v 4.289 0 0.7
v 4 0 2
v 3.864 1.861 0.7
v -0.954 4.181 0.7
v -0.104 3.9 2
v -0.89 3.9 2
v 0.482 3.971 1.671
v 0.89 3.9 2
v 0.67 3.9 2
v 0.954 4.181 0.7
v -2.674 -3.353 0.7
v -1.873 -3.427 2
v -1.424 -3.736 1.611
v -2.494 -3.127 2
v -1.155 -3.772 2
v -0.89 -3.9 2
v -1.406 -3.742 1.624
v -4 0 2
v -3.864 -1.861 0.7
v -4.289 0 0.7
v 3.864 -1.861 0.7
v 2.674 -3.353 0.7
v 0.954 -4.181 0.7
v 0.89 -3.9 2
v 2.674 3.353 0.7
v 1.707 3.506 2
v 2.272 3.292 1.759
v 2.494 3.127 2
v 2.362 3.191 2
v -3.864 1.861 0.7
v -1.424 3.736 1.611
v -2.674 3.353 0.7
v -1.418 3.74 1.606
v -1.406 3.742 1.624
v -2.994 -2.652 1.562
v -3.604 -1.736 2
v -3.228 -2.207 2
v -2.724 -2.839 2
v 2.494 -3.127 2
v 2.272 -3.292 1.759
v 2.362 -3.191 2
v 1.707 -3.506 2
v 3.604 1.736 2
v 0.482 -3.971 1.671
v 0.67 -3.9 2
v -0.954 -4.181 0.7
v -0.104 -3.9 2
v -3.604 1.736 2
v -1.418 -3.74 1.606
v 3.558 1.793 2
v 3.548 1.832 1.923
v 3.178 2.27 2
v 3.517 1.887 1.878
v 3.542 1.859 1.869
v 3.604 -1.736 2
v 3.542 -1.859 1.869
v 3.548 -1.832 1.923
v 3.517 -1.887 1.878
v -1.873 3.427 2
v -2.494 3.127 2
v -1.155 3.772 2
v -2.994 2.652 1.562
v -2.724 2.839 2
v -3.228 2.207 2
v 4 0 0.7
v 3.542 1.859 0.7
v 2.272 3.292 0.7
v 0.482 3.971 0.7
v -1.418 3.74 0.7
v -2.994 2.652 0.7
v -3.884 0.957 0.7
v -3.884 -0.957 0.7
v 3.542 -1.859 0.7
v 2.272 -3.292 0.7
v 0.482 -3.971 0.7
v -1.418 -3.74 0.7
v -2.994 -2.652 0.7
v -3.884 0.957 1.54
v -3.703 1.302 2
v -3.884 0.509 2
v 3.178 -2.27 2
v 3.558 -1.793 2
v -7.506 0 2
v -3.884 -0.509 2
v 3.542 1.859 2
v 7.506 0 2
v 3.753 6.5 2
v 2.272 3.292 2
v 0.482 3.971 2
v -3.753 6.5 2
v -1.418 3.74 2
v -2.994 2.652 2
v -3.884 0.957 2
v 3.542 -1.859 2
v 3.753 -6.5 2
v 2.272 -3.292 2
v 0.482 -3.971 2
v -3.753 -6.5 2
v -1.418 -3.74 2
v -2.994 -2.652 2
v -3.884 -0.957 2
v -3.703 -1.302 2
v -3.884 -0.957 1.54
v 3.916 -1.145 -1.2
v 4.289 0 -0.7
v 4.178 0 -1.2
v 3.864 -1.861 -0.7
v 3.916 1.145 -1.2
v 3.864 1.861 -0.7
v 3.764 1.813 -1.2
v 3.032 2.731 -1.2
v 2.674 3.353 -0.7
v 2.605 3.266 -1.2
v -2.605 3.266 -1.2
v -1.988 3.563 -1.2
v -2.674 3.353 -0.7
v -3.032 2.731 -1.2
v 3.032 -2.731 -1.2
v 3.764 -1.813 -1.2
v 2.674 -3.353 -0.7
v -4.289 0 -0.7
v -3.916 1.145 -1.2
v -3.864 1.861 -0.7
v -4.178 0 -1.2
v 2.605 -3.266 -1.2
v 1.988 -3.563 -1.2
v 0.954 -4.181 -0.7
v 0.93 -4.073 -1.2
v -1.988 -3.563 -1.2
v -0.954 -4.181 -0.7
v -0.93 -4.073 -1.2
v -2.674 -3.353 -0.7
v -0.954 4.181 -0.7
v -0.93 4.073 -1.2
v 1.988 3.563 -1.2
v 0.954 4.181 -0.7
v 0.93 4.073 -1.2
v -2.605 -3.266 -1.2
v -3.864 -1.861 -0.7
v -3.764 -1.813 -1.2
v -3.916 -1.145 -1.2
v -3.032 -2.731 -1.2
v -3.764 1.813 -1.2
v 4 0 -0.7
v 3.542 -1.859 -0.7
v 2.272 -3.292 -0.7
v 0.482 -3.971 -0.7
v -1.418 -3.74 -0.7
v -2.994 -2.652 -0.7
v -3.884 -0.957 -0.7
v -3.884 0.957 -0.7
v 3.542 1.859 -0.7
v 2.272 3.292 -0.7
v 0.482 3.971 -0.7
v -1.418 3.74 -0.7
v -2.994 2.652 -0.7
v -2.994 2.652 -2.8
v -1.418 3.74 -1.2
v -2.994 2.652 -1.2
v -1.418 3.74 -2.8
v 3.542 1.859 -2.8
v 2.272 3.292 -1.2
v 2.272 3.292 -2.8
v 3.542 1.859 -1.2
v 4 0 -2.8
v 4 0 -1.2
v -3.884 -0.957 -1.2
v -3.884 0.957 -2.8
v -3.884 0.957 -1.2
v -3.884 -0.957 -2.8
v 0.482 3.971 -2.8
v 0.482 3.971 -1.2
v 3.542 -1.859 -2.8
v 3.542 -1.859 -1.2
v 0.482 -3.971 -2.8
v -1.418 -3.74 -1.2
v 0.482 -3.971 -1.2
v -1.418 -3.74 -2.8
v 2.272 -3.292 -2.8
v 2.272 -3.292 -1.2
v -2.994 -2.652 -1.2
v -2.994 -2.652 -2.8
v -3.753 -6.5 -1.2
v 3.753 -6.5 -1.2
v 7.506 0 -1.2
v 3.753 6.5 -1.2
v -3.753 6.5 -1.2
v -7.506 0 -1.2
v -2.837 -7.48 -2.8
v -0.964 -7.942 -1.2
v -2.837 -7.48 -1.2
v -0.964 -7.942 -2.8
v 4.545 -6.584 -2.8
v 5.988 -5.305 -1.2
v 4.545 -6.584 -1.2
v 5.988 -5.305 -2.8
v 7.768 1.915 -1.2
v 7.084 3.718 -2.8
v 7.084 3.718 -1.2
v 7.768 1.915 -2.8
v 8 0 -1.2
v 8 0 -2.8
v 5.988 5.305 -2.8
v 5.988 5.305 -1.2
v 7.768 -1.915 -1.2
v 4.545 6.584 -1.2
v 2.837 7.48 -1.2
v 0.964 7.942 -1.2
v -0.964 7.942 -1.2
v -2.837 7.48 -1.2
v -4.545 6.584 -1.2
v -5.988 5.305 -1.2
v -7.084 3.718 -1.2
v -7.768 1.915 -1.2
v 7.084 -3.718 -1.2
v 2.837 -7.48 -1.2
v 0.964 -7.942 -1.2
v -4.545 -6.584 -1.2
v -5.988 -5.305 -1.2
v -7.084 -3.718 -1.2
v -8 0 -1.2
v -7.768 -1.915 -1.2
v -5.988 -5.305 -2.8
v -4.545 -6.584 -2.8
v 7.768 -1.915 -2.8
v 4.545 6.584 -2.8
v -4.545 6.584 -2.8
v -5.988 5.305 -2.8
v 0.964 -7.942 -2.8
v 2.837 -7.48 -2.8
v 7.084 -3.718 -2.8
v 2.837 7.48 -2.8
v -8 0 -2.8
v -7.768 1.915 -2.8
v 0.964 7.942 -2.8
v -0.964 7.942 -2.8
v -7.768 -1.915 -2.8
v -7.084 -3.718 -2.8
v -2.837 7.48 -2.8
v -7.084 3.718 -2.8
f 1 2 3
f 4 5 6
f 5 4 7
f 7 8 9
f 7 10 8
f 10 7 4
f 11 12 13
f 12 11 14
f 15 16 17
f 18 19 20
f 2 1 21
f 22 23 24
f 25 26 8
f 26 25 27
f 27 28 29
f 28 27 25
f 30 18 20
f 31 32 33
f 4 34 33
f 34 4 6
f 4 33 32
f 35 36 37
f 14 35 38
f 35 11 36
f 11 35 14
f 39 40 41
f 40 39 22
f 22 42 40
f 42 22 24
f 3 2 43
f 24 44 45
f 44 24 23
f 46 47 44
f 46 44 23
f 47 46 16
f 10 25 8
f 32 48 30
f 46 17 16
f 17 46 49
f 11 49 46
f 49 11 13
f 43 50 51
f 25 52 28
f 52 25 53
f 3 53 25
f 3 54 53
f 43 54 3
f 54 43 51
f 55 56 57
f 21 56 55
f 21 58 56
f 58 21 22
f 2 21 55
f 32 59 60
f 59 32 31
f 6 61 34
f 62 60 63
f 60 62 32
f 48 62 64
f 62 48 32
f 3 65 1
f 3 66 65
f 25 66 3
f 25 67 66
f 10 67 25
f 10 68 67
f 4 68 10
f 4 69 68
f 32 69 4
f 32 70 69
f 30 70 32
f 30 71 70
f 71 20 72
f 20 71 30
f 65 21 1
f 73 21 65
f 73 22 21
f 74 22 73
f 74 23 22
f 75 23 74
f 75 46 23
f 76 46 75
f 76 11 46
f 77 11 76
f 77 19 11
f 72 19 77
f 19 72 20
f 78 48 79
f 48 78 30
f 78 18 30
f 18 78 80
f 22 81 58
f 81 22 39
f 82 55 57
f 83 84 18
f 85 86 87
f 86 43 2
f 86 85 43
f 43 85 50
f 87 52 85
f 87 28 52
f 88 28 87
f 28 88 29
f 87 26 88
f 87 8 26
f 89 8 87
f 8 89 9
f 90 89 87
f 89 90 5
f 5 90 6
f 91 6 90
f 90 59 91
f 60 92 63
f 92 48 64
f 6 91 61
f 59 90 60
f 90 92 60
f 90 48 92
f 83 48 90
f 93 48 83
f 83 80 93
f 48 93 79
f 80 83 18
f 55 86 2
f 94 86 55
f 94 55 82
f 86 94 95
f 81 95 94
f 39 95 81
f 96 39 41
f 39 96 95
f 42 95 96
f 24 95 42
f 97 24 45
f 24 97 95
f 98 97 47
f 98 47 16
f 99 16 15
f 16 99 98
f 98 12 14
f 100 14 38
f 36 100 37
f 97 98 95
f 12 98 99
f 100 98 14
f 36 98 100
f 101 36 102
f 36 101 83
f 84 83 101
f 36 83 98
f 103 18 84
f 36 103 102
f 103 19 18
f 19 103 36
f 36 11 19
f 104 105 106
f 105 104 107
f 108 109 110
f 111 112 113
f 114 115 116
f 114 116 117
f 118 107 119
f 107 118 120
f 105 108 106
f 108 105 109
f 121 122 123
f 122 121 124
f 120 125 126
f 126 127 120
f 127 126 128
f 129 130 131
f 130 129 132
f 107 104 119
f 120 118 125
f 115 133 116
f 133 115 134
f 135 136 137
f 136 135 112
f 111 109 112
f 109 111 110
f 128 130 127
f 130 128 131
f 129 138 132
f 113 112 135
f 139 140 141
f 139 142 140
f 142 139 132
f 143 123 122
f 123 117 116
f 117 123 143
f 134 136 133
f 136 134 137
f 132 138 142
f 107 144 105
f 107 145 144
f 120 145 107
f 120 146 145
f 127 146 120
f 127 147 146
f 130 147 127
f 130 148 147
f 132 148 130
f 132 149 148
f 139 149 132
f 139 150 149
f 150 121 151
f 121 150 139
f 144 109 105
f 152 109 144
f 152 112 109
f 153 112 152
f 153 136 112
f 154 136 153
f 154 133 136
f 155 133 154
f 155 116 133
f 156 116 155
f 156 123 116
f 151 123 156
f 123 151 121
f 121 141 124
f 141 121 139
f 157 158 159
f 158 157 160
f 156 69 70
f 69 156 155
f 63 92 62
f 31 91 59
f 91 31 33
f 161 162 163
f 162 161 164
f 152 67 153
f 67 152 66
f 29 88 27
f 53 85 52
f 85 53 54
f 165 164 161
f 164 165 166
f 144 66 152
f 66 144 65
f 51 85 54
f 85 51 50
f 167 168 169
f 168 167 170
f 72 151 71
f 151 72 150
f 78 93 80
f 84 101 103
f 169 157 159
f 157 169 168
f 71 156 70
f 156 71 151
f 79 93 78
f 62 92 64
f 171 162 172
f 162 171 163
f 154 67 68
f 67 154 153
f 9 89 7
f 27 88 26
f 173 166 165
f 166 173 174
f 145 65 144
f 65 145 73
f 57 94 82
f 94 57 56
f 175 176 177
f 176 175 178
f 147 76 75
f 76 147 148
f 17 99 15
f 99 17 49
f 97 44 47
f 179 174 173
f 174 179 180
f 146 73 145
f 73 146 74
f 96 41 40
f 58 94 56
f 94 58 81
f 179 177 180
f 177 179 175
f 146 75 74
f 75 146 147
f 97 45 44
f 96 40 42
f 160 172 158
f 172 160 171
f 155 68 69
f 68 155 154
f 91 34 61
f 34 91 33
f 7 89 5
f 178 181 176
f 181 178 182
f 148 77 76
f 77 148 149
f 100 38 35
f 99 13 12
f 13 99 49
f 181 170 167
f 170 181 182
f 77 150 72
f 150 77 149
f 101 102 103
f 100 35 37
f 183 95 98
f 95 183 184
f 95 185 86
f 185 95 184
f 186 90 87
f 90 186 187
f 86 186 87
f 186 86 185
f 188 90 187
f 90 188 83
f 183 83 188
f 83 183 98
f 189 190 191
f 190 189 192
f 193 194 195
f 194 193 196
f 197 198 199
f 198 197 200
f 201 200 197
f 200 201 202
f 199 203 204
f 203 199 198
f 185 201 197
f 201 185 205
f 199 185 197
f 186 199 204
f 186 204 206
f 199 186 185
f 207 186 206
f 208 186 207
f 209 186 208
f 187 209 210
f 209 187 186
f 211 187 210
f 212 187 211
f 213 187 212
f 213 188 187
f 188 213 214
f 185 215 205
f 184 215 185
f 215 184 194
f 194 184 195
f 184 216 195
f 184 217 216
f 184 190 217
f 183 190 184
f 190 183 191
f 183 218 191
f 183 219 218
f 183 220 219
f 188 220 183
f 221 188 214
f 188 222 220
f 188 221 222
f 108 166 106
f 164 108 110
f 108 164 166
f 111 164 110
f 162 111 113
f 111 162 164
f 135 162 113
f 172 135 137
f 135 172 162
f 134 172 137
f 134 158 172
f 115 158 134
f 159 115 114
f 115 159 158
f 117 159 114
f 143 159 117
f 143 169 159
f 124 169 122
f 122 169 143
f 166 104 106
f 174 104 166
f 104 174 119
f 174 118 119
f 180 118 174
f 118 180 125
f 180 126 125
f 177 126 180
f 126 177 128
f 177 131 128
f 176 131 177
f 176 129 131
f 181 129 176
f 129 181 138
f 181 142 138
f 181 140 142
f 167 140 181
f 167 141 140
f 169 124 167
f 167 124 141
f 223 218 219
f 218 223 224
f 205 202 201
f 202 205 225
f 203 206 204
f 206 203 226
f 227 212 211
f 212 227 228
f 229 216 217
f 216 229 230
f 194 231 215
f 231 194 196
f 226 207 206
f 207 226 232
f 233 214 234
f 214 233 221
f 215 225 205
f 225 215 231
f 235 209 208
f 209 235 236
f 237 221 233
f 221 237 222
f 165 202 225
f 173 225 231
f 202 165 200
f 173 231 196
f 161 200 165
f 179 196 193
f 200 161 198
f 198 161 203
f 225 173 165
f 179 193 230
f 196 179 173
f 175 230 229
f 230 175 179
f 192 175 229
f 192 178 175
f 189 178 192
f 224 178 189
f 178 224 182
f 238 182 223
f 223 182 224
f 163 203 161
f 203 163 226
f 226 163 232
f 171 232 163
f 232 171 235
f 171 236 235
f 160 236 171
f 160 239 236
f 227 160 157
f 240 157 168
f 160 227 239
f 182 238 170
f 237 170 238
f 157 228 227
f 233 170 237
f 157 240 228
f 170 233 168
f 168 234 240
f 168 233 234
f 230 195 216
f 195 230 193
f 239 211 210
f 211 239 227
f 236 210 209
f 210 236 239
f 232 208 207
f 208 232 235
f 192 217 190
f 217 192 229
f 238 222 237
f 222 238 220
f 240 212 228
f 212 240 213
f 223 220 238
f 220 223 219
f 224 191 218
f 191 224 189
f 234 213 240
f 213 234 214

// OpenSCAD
// Parameters
thread_nominal_diameter = 8; //[4:16:0.1]
across_flats = 13; //[6.5:26:0.1]
thickness = 4; //[2:8:0.1]
hole_diameter = 8; //[6:10:0.05]
hex_corner_diameter = 15.011; //[7.5055:30.022:0.001]
chamfer_height = 0.5; //[0.25:1:0.05]
chamfer_angle_deg = 30; //[15:60:1]
washer_outer_diameter = 16; //[8:32:0.1]
washer_thickness = 1.6; //[0.8:3.2:0.1]
overlap = 0.8; //[0.5:2:0.1]

// Nut and Washer - complete geometry
module nut_and_washer() {
  color("DimGray") {
    // Hex Nut Body
    difference() {
      cylinder(r=across_flats/(2*cos(30)), h=thickness, center=true, $fn=6);
      // Central Through Hole and Chamfers
      union() {
        cylinder(r=hole_diameter/2, h=thickness + 2*overlap, center=true);
        // Edge Chamfers
        union() {
          translate([0, 0, thickness/2 - (chamfer_height + overlap)/2])
            cylinder(r1=hole_diameter/2 + chamfer_height*tan(chamfer_angle_deg), 
                     r2=hole_diameter/2, 
                     h=chamfer_height + overlap, 
                     center=true);
          translate([0, 0, -thickness/2 + (chamfer_height + overlap)/2])
            rotate([180, 0, 0])
            cylinder(r1=hole_diameter/2 + chamfer_height*tan(chamfer_angle_deg), 
                     r2=hole_diameter/2, 
                     h=chamfer_height + overlap, 
                     center=true);
        }
      }
    }
  }
  
  // Washer
  color("Silver") {
    difference() {
      translate([0, 0, -(thickness/2 + washer_thickness/2 - overlap)])
        cylinder(r=washer_outer_diameter/2, h=washer_thickness, center=true);
      translate([0, 0, -(thickness/2 + washer_thickness/2 - overlap)])
        cylinder(r=hole_diameter/2, h=washer_thickness + 2*overlap, center=true);
    }
  }
}

// Assembly
module assembly() {
  nut_and_washer();
}

assembly();
